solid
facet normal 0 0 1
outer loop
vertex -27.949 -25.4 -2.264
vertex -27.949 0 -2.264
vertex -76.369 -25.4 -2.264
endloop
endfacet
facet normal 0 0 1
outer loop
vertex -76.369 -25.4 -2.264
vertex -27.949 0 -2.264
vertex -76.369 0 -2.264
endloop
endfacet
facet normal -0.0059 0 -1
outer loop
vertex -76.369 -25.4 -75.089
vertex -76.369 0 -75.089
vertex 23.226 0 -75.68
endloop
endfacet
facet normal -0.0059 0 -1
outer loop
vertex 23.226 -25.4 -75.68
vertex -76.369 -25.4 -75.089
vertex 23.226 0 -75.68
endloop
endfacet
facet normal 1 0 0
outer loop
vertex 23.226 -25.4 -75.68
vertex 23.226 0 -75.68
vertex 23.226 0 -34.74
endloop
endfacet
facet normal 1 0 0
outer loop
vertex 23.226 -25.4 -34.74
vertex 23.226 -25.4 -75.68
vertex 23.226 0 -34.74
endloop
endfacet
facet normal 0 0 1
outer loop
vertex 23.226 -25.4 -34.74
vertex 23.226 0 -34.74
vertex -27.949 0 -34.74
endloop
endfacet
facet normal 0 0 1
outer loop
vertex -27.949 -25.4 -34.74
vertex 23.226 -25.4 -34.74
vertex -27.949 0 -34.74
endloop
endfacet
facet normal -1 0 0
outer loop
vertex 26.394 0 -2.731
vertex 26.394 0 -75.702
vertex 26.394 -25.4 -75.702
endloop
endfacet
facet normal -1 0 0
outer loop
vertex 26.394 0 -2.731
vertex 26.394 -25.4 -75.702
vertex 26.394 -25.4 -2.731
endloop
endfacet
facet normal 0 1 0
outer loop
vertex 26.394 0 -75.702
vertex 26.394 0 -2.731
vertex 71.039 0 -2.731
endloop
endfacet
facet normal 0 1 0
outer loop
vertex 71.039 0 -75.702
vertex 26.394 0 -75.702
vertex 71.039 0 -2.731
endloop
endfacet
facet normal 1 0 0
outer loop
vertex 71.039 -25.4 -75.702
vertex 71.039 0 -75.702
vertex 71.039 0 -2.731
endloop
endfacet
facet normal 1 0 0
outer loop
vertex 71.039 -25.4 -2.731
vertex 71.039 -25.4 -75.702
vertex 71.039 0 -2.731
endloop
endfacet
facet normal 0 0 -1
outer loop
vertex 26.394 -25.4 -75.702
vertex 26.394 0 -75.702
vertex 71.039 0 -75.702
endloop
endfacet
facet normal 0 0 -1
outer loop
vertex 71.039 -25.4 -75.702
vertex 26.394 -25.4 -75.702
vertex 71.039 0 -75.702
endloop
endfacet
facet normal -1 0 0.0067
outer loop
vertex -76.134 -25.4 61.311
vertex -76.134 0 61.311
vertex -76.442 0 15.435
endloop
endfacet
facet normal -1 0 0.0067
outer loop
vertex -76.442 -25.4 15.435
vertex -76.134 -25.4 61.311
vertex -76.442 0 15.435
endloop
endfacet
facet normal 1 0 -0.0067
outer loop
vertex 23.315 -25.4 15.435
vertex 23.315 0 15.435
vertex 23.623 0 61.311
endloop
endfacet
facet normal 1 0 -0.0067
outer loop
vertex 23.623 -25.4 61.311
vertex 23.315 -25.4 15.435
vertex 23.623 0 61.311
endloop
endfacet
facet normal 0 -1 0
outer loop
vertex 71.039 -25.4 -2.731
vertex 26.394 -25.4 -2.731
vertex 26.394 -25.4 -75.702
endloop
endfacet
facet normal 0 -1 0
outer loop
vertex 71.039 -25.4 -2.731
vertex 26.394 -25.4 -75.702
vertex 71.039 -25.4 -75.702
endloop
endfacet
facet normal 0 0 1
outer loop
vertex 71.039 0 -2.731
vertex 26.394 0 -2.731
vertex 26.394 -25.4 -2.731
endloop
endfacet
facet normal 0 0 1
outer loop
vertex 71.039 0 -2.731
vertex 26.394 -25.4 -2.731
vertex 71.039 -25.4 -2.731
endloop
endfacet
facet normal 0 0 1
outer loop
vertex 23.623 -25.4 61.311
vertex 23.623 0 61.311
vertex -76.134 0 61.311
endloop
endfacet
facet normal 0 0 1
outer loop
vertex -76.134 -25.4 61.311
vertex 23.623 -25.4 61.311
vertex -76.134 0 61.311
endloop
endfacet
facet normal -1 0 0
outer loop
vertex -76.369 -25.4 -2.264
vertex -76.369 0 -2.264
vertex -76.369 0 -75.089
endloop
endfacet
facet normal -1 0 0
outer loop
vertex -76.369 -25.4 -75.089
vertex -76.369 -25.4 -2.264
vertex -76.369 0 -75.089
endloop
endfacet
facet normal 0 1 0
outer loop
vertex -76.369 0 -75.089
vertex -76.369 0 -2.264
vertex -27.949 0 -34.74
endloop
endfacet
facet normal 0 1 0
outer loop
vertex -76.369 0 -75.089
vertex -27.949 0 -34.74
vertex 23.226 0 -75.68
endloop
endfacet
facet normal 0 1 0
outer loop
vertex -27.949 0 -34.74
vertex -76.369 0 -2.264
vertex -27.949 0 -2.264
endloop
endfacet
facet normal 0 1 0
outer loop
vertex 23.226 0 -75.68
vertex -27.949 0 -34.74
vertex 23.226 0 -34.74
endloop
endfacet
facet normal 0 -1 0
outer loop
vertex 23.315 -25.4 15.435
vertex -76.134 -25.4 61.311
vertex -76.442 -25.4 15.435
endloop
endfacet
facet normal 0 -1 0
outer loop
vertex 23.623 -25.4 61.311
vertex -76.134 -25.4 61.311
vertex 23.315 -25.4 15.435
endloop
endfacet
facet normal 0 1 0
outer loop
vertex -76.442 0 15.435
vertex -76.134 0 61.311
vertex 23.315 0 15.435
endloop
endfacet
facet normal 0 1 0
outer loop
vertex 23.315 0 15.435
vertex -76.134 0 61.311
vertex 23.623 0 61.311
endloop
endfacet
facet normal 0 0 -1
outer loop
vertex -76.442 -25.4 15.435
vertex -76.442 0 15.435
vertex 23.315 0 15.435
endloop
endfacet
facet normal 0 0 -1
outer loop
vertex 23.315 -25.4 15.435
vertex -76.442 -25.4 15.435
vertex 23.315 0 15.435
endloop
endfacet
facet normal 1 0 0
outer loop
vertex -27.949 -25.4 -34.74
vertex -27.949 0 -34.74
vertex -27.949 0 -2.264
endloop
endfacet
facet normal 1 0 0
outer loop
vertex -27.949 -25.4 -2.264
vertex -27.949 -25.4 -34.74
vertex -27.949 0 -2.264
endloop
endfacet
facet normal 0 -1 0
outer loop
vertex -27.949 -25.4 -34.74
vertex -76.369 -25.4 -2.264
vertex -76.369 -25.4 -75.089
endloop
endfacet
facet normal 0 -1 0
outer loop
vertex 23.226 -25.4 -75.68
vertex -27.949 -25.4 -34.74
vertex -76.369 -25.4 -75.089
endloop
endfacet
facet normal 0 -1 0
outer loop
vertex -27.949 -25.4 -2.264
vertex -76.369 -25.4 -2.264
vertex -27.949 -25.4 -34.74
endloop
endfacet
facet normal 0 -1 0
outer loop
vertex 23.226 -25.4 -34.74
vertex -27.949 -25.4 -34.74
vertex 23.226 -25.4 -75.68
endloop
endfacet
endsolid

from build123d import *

# Parameters (mm, degrees)
F1_DEPTH = 25.4
F3_DEPTH = 25.4
F4_W     = 44.644367
F4_H     = 72.970451
F5_DEPTH = 25.4


with BuildPart() as f1:
    # F0 (on Front) → F1 (new body)
    with BuildSketch(Plane.XZ):
        Polygon((-27.949372, -2.263505), (-76.368704, -2.263505), (-76.368704, -75.089335), (23.225535, -75.679816), (23.225535, -34.739889), (-27.949372, -34.739889), align=None)
    extrude(amount=F1_DEPTH)


with BuildPart() as f3:
    # F2 (on Front) → F3 (new body)
    with BuildSketch(Plane.XZ):
        Polygon((23.623349, 61.310526), (-76.133728, 61.310526), (-76.441623, 15.434587), (23.315458, 15.434587), align=None)
    extrude(amount=F3_DEPTH)


with BuildPart() as f5:
    # F4 (on Front) → F5 (new body)
    with BuildSketch(Plane.XZ):
        with Locations((48.716561, -39.216279)):
            Rectangle(F4_W, F4_H)
    extrude(amount=F5_DEPTH)


solid = Compound([f1.part, f3.part, f5.part])
